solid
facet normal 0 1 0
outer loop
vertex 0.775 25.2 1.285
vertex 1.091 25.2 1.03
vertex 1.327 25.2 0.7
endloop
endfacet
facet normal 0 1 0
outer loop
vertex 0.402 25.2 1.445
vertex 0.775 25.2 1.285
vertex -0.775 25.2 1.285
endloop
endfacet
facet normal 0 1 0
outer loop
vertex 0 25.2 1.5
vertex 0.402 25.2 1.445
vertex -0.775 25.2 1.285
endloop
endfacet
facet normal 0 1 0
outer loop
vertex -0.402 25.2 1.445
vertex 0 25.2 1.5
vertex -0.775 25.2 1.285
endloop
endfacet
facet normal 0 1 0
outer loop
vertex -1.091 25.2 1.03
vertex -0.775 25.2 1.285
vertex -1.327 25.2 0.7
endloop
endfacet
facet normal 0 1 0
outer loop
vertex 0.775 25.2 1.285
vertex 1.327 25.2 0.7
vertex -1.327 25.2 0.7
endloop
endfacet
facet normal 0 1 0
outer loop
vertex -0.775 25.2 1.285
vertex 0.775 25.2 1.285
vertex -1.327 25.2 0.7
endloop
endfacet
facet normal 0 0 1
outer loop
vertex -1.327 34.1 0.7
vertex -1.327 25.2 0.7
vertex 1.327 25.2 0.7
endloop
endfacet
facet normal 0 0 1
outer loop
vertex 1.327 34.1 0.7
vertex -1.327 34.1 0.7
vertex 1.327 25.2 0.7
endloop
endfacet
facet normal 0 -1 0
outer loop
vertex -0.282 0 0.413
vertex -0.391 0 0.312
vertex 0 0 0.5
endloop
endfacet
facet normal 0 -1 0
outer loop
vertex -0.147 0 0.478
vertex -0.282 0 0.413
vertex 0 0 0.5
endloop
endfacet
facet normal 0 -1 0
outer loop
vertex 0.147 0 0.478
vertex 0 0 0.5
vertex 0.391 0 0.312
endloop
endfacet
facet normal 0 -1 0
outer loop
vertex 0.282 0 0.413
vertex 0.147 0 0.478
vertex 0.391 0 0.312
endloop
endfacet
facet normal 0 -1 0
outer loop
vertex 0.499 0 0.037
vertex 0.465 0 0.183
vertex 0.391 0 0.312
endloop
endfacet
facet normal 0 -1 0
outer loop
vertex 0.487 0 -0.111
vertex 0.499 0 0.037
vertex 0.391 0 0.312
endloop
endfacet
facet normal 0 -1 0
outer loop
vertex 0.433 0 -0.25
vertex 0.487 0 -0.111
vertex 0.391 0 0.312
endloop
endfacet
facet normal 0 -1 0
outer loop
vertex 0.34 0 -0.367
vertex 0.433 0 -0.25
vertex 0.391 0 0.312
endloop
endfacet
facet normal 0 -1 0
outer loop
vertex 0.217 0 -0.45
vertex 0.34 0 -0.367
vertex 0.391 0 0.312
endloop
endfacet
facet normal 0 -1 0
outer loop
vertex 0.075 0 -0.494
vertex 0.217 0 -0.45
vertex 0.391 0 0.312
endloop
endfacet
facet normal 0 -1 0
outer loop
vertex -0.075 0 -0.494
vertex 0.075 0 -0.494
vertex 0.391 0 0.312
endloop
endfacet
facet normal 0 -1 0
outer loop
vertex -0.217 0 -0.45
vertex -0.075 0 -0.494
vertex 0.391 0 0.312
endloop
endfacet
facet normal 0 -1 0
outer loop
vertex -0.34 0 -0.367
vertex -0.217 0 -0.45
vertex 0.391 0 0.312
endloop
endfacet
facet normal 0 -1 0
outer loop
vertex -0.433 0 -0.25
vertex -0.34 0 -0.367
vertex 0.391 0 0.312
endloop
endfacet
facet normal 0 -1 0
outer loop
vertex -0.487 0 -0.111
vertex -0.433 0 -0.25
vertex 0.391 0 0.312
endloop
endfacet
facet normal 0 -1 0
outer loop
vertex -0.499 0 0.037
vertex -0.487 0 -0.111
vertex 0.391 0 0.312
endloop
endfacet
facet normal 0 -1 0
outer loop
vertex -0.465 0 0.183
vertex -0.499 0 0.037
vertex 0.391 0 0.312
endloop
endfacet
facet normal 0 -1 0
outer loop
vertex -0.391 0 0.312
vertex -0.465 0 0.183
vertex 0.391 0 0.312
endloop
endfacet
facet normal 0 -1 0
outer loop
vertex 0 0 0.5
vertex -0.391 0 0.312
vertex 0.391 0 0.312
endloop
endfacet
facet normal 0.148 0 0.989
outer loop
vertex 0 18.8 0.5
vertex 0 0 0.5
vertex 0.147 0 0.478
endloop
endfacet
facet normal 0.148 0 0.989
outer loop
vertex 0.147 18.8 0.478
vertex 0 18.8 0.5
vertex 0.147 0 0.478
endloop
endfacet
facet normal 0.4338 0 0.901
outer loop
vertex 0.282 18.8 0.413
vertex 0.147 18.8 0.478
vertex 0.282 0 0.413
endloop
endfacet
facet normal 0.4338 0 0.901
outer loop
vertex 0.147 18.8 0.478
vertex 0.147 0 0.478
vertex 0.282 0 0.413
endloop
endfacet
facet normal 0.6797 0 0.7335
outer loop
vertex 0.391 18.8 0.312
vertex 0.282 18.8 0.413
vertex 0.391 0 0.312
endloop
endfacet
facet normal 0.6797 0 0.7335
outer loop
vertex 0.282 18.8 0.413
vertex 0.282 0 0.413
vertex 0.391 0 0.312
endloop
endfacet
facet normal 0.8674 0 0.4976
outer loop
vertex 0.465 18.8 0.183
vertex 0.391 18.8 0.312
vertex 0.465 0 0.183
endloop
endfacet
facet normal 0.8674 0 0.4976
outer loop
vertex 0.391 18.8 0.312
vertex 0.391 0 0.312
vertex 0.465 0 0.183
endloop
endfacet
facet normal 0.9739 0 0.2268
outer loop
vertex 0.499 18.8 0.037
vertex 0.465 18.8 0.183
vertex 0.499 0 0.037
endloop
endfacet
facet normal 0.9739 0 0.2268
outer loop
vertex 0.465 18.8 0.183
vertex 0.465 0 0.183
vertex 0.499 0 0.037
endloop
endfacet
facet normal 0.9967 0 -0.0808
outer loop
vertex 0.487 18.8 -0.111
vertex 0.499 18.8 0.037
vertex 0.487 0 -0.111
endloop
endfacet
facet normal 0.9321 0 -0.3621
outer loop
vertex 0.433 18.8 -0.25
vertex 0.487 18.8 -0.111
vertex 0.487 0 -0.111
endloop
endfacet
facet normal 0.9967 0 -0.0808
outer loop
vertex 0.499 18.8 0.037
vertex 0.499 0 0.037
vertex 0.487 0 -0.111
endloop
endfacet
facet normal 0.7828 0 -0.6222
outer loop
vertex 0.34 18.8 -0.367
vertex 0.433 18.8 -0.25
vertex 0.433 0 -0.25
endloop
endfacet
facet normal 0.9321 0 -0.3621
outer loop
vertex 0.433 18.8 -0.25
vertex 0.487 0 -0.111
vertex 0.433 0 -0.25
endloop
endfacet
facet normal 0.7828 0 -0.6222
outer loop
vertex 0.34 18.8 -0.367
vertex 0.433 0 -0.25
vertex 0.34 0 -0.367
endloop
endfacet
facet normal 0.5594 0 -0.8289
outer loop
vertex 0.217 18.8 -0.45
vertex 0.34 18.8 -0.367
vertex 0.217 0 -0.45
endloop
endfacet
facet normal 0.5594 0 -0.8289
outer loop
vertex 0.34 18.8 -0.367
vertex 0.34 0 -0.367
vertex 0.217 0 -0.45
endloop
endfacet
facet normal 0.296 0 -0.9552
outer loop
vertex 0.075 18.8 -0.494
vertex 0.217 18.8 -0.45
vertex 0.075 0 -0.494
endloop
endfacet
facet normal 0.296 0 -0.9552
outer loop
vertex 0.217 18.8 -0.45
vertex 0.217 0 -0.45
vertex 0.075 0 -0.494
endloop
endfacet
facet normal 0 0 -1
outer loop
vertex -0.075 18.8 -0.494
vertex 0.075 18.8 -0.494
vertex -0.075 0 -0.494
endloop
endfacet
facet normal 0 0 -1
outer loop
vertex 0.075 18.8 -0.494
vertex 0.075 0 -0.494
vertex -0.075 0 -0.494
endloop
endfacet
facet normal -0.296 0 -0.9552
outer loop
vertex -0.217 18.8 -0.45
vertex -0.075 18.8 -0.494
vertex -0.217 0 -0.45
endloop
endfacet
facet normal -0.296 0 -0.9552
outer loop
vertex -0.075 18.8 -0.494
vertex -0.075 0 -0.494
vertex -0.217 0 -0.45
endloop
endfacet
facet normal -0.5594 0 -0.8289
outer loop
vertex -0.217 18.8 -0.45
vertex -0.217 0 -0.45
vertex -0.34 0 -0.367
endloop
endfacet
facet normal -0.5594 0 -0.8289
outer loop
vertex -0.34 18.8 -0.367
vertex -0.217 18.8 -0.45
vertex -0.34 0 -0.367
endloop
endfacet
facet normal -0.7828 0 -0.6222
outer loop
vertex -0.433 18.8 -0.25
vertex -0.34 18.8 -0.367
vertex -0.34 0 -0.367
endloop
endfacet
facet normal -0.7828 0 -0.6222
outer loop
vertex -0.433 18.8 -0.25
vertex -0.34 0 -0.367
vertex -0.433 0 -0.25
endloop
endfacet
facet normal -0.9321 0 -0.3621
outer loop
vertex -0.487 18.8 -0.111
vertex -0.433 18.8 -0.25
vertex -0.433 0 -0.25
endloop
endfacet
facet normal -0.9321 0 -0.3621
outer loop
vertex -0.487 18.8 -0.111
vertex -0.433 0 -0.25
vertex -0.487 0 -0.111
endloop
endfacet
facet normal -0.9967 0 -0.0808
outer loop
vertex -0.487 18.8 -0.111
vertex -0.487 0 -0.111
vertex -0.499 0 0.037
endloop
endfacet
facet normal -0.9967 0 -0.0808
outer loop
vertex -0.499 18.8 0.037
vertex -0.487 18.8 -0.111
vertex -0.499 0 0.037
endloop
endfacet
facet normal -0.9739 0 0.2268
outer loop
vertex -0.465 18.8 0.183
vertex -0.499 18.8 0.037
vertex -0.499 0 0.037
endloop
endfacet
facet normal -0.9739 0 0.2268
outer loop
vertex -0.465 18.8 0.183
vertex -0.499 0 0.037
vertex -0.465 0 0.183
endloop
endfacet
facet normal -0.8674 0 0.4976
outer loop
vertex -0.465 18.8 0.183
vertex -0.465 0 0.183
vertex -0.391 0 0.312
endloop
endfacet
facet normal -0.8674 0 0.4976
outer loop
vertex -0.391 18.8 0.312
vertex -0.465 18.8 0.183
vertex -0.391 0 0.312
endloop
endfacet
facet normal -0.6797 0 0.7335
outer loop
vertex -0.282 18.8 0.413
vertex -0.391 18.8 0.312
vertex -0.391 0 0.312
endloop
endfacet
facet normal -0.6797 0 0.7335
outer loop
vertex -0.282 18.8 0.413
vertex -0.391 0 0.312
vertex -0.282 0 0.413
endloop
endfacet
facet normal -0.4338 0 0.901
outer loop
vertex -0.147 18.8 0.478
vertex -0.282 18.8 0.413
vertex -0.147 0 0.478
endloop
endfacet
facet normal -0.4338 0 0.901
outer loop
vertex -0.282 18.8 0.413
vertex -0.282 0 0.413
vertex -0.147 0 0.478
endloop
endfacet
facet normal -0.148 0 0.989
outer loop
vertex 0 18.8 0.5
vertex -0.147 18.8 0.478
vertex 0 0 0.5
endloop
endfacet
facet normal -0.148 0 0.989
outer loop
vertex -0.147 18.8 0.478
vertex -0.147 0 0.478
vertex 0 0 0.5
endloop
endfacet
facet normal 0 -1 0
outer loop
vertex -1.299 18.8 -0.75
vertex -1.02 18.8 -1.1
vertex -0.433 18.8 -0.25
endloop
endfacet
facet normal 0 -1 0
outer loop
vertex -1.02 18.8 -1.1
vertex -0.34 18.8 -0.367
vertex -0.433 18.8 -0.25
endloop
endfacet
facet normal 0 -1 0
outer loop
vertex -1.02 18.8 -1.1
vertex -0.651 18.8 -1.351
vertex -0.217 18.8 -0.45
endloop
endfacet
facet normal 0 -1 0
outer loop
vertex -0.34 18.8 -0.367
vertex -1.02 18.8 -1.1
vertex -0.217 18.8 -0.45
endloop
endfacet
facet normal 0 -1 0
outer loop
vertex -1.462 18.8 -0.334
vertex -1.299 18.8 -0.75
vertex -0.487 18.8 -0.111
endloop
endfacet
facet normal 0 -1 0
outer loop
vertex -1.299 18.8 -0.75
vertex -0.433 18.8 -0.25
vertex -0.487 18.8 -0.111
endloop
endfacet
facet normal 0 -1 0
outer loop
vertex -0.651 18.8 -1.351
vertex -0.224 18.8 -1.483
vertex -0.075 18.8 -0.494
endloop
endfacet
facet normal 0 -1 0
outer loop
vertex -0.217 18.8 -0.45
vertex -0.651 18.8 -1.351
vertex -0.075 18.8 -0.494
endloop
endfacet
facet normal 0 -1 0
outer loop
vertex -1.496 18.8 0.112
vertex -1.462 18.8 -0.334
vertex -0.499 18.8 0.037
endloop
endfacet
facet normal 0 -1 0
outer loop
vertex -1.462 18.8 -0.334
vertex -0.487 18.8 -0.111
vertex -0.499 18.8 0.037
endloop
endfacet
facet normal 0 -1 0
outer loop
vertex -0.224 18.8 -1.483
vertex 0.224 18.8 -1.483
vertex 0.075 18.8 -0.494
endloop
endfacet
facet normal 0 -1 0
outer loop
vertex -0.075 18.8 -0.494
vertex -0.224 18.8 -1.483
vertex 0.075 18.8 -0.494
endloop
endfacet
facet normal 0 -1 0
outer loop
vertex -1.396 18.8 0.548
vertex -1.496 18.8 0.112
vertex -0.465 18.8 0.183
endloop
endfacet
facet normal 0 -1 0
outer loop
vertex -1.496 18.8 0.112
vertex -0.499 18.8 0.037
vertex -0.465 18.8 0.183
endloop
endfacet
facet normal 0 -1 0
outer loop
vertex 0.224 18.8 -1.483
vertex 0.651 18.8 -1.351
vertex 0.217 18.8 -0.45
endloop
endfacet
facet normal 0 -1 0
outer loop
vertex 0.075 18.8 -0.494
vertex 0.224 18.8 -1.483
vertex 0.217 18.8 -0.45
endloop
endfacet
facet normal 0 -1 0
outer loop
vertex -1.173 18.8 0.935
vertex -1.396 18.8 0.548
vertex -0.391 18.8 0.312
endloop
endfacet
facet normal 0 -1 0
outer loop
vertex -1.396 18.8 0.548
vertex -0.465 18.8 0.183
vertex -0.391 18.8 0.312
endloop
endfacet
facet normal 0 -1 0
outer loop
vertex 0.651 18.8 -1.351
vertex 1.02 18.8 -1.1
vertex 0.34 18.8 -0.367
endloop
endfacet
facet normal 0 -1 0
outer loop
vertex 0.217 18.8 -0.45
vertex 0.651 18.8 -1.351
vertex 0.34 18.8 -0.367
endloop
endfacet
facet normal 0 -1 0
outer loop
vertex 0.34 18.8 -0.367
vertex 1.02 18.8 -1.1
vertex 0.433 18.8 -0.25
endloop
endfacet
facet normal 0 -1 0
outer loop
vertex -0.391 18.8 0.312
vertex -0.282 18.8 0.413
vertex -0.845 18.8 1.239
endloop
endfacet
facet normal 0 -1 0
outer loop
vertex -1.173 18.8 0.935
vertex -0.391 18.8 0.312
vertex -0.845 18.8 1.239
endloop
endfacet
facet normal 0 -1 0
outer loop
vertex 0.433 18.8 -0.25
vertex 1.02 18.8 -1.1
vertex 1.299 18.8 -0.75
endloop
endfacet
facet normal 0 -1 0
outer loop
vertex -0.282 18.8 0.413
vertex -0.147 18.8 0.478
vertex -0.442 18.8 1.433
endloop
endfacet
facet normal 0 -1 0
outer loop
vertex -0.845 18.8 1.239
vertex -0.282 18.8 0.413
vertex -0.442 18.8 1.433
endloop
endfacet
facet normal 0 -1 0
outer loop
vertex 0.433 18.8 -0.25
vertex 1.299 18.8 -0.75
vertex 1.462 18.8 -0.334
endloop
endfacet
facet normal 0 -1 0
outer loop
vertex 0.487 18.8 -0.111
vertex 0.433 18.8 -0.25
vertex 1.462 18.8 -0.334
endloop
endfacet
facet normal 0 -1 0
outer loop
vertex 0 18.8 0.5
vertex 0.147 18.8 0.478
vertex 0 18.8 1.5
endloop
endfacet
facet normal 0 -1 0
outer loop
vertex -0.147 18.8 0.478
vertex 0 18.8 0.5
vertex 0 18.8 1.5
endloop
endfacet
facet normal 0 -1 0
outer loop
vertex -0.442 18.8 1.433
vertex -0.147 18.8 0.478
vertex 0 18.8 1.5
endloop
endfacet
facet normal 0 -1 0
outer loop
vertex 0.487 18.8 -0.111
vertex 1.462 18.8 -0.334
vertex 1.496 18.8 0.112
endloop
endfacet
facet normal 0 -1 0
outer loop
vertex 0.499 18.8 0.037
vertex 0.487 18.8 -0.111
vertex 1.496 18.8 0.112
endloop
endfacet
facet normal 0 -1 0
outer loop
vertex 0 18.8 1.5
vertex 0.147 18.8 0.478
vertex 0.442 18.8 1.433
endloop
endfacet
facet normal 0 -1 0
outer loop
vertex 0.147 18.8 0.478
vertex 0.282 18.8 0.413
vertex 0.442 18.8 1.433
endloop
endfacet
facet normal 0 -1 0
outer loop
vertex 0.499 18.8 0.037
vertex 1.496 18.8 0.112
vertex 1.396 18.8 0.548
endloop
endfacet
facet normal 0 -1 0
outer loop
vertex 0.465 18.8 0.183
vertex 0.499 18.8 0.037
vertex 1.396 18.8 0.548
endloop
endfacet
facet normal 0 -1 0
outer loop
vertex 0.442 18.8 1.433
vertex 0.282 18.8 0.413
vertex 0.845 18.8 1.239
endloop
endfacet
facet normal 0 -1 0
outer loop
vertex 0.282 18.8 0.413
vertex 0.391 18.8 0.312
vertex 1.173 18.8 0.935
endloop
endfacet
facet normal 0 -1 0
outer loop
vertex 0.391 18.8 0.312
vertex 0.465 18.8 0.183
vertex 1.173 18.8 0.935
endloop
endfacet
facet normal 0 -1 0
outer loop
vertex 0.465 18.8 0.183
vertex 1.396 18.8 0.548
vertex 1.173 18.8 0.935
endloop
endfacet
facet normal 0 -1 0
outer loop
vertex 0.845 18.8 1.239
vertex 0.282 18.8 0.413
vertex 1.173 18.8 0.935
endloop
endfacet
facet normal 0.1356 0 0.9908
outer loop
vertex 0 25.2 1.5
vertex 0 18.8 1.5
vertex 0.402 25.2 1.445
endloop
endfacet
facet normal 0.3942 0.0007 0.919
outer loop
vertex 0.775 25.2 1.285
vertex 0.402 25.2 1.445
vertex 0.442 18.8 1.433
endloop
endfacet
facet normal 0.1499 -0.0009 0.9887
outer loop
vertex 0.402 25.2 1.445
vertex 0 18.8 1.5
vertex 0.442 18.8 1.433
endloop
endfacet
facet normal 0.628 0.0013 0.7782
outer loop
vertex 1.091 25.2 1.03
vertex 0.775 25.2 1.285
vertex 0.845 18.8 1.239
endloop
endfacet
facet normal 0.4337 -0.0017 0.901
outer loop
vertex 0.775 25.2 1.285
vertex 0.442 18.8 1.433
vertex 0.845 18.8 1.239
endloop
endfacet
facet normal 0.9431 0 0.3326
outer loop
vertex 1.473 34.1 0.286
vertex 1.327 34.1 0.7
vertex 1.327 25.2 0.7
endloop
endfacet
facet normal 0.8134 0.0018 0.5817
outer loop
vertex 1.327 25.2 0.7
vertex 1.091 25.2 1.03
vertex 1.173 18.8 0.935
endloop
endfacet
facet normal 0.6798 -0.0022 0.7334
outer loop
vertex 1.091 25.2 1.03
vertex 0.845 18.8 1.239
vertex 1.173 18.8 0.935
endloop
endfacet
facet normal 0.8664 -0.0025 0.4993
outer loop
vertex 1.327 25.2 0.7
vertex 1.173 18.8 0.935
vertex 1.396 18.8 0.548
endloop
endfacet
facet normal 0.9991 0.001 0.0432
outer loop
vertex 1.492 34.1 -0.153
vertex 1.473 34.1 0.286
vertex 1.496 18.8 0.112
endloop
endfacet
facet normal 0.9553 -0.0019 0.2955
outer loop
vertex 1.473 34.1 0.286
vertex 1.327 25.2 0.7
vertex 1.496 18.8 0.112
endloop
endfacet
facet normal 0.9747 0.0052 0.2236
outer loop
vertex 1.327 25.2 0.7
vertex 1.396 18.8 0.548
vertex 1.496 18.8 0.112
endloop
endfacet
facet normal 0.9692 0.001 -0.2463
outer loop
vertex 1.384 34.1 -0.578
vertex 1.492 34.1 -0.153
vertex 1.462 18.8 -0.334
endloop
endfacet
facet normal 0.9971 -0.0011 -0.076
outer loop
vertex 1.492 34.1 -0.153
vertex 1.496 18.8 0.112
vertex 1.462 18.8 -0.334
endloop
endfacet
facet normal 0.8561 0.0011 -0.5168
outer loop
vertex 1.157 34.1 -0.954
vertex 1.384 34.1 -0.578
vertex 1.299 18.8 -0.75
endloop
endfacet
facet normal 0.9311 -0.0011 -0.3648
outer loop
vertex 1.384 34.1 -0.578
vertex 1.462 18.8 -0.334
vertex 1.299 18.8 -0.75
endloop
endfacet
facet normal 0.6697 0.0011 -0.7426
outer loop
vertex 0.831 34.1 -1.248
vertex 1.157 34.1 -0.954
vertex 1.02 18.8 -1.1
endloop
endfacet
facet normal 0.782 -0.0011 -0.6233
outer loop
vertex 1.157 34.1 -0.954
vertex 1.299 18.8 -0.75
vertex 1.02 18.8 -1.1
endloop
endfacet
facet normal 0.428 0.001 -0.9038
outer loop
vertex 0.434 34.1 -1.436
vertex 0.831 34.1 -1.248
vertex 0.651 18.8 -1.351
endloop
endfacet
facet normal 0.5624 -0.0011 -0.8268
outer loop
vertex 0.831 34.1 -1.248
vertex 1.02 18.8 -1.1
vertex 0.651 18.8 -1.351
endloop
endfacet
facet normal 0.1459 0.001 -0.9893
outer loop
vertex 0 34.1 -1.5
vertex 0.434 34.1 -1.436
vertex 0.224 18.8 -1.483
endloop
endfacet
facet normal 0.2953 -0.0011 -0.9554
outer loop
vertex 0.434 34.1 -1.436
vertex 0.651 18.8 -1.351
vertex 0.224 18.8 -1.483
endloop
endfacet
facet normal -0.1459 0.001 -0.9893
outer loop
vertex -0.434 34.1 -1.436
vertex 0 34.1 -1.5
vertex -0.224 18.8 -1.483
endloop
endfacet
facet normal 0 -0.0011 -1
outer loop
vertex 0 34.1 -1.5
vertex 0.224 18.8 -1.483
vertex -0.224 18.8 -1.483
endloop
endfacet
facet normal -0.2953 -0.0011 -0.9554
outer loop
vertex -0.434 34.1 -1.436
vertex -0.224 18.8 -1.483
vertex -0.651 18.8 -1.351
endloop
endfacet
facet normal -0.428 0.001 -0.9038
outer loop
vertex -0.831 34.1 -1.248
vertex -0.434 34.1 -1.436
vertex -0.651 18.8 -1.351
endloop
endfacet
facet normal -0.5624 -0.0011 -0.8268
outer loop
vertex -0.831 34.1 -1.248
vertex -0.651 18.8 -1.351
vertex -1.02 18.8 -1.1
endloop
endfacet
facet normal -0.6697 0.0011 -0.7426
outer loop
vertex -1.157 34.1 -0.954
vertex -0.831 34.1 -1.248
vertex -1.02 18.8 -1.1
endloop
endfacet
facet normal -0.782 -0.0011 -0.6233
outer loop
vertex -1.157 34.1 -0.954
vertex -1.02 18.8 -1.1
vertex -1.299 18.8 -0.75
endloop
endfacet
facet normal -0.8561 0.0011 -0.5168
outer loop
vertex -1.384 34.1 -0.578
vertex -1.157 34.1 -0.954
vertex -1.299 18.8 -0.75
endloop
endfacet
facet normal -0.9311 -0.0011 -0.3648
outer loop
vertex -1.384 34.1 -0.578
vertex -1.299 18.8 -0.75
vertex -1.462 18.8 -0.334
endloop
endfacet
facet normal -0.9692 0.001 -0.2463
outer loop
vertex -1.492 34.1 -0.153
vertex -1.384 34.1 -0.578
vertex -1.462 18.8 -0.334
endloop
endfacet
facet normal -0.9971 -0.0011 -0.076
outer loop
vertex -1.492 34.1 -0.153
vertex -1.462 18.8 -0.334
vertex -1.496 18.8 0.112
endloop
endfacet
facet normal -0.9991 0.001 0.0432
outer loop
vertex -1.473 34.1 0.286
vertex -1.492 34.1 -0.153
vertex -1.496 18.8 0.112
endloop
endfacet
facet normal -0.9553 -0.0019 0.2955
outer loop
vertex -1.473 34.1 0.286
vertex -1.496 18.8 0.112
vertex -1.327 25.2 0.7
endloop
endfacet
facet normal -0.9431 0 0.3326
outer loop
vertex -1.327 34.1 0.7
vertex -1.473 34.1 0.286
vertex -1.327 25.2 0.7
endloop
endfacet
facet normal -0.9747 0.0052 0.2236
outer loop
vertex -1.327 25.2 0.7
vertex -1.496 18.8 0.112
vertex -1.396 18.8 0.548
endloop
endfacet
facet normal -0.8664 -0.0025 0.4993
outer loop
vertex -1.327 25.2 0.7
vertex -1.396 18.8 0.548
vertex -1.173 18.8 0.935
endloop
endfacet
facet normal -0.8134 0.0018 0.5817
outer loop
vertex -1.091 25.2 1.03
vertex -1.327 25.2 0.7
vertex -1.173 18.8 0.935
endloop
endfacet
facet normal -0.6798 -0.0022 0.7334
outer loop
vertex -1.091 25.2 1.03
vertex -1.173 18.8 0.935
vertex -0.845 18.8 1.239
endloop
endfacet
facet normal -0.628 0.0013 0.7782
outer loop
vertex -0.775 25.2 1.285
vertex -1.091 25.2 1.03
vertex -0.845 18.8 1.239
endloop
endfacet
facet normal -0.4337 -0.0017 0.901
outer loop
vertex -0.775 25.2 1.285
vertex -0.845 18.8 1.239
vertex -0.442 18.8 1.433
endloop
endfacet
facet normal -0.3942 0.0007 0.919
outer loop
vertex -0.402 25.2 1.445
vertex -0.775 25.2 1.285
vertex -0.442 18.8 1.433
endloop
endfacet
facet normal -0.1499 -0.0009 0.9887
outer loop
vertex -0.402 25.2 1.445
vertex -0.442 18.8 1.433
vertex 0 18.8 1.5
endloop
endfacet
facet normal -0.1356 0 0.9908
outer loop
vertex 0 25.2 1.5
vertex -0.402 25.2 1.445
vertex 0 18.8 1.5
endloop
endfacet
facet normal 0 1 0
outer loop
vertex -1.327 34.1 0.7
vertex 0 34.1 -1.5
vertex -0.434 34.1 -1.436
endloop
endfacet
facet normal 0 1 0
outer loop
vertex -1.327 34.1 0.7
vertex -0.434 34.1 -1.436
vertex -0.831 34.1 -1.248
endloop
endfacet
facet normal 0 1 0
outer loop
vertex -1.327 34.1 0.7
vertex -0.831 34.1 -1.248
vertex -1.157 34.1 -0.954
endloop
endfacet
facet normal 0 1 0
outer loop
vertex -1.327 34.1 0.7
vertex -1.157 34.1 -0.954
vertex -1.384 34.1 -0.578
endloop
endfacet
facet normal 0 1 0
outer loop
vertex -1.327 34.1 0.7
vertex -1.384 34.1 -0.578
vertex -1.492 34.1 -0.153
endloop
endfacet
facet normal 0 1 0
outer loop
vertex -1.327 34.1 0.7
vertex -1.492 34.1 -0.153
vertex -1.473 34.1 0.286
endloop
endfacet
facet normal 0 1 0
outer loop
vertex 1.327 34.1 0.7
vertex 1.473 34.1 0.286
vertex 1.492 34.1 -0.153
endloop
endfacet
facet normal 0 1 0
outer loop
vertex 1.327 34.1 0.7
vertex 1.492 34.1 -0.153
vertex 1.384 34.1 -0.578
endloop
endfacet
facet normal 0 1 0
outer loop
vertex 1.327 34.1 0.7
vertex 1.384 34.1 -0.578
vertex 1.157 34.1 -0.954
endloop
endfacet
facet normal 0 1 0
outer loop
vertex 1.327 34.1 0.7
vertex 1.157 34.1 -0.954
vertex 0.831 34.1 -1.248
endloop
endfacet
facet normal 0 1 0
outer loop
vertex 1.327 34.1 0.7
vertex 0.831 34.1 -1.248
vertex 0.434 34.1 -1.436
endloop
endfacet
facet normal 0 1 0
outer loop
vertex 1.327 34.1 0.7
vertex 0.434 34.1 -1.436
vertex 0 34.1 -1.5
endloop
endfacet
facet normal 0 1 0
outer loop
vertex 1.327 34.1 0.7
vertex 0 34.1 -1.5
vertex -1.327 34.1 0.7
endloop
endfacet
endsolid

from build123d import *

# Parameters (mm, degrees)
CROQUIS1_R              = 0.5
SALIENTE_EXTRUIR1_DEPTH = 18.8
CROQUIS2_R              = 1.5
SALIENTE_EXTRUIR2_DEPTH = 15.3
CORTAR_EXTRUIR1_START   = -8.9
CORTAR_EXTRUIR1_DEPTH   = 8.9


with BuildPart() as part:
    # Croquis1 → Saliente-Extruir1 (new body)
    with BuildSketch(Plane(origin=(0, 0, 0), x_dir=(1, 0, 0), z_dir=(0, 1, 0))):
        with Locations(Location((0, 0, 0), (0, 0, 270))):
            Circle(CROQUIS1_R)
    extrude(amount=SALIENTE_EXTRUIR1_DEPTH)

    # Croquis2 → Saliente-Extruir2 (add)
    with BuildSketch(Plane(origin=(0, 18.8, 0), x_dir=(1, 0, 0), z_dir=(0, 1, 0))):
        with Locations(Location((0, 0, 0), (0, 0, 270))):
            Circle(CROQUIS2_R)
    extrude(amount=SALIENTE_EXTRUIR2_DEPTH)

    # Croquis3 → Cortar-Extruir1 (cut)
    with BuildSketch(Plane(origin=(0, 34.1, 0), x_dir=(1, 0, 0), z_dir=(0, 1, 0)).offset(CORTAR_EXTRUIR1_START)):
        with BuildLine():
            Line((-1.326649916, -0.7), (1.326649916, -0.7))
            ThreePointArc((1.326649916, -0.7), (0, -1.5), (-1.326649916, -0.7))
        make_face()
    extrude(amount=CORTAR_EXTRUIR1_DEPTH, mode=Mode.SUBTRACT)


solid = part.part
